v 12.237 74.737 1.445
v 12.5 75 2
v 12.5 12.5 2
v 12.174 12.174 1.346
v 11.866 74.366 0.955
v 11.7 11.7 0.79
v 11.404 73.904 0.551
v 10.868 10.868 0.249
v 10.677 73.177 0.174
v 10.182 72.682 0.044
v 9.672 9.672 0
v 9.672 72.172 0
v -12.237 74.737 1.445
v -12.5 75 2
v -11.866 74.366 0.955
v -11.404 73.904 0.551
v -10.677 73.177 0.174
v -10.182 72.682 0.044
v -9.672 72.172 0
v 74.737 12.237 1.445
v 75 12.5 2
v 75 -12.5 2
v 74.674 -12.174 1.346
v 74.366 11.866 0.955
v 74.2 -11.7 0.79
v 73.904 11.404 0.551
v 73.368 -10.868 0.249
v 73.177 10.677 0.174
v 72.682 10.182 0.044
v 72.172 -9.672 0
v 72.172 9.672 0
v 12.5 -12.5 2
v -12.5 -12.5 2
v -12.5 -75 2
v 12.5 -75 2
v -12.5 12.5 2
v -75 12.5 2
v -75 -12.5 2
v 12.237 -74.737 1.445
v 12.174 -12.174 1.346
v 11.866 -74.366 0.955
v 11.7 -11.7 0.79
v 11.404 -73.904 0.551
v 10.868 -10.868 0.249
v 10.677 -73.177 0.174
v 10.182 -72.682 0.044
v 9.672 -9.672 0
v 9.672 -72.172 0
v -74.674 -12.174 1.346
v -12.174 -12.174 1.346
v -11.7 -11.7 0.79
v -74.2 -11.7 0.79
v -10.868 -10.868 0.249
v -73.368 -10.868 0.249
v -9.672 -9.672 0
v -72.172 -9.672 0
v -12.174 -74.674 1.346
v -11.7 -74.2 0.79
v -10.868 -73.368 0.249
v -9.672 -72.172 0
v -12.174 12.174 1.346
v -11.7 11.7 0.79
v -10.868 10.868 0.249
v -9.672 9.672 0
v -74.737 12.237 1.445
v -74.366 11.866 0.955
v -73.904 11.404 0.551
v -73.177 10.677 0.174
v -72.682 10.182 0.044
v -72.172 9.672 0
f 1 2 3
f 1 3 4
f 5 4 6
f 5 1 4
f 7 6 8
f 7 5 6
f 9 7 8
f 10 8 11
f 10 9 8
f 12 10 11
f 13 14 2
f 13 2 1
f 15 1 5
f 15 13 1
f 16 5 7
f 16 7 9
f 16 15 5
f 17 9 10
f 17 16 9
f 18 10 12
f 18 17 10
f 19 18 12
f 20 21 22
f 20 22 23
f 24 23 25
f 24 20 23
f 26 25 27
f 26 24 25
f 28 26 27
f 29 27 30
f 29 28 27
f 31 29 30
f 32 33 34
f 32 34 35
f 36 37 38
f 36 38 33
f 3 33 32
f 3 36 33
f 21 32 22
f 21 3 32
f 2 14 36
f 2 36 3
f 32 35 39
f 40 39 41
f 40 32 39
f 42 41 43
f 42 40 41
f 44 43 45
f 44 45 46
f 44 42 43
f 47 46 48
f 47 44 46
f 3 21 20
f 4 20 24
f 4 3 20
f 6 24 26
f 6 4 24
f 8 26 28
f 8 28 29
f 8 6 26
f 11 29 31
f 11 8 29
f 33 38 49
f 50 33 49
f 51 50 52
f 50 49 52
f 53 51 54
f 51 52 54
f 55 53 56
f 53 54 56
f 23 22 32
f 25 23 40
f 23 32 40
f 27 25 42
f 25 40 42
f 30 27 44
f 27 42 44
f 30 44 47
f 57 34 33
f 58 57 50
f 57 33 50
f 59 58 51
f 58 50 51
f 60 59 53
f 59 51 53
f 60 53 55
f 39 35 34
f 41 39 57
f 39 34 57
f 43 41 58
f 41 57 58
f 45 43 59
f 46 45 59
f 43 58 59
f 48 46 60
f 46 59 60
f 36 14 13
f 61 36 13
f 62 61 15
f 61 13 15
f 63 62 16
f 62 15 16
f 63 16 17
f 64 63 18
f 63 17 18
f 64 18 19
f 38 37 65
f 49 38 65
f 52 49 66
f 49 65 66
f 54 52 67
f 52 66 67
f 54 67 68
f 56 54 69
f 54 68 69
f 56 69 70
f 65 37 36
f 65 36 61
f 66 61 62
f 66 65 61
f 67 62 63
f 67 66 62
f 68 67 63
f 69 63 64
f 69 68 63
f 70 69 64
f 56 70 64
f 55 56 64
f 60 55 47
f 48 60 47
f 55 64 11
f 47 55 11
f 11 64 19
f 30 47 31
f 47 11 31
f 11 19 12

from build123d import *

# Parameters (mm, degrees)
F0_W         = 62.5
F0_H         = 25
F0_W_2       = 25
F0_H_2       = 62.5
F1_DEPTH     = 2
F2_T1_DEPTH  = 69.5710678119
F2_T3_DEPTH  = 69.5710678119
F2_T5_DEPTH  = 39.1421356237
F2_T7_DEPTH  = 69.5710678119
F2_T9_DEPTH  = 39.1421356237
F2_T11_DEPTH = 69.5710678119
F2_T17_DEPTH = 69.5710678119
F2_T21_DEPTH = 69.5710678119
F2_T28_DEPTH = 69.5710678119
F2_T32_DEPTH = 69.5710678119
F2_T39_DEPTH = 69.5710678119
F2_T43_DEPTH = 69.5710678119
F2_T50_DEPTH = 69.5710678119
F2_T54_DEPTH = 69.5710678119


# Not quite as in the source:
# - a fillet or chamfer that OpenCascade refuses, or shapes differently, is made with other operations: its cross-section is extruded or revolved along the edge and cut away or added
# - a feature names something its author has since deleted; it is built from what else it names


with BuildPart() as f1:
    # F0 (on Top) → F1 (new body)
    with BuildSketch(Plane.XY):
        with Locations((-43.75, 0)):
            Rectangle(F0_W, F0_H)
        Rectangle(F0_W_2, F0_H)
        with Locations((0, -43.75)):
            Rectangle(F0_W_2, F0_H_2)
        with Locations((0, 43.75)):
            Rectangle(F0_W_2, F0_H_2)
        with Locations((43.75, 0)):
            Rectangle(F0_W, F0_H)
    extrude(amount=F1_DEPTH)

    # F2: fillet of radius 3 on 12 edges, made by hand

    # F2_s2 → F2_t1 (cut)
    with BuildSketch(Plane.YZ.offset(-82.0710678119)):
        with BuildLine():
            ThreePointArc((-12.5, 2), (-11.4036236828, 0.5505102572), (-9.6715728753, 0))
            Line((-9.6715728753, 0), (-12.5, 0))
            Line((-12.5, 0), (-12.5, 2))
        make_face()
        with BuildLine():
            ThreePointArc((12.5, 2), (11.4036236828, 0.5505102572), (9.6715728753, 0))
            Line((9.6715728753, 0), (12.5, 0))
            Line((12.5, 0), (12.5, 2))
        make_face()
    extrude(amount=F2_T1_DEPTH, mode=Mode.SUBTRACT)

    # F2_s4 → F2_t3 (cut)
    with BuildSketch(Plane.XZ.offset(12.5)):
        with BuildLine():
            ThreePointArc((-12.5, 2), (-11.4036236828, 0.5505102572), (-9.6715728753, 0))
            Line((-9.6715728753, 0), (-12.5, 0))
            Line((-12.5, 0), (-12.5, 2))
        make_face()
        with BuildLine():
            ThreePointArc((12.5, 2), (11.4036236828, 0.5505102572), (9.6715728753, 0))
            Line((9.6715728753, 0), (12.5, 0))
            Line((12.5, 0), (12.5, 2))
        make_face()
    extrude(amount=F2_T3_DEPTH, mode=Mode.SUBTRACT)

    # F2_s6 → F2_t5 (cut)
    with BuildSketch(Plane.YZ.offset(-19.5710678119)):
        with BuildLine():
            ThreePointArc((-75, 2), (-73.9036236828, 0.5505102572), (-72.1715728753, 0))
            Line((-72.1715728753, 0), (-75, 0))
            Line((-75, 0), (-75, 2))
        make_face()
        with BuildLine():
            ThreePointArc((75, 2), (73.9036236828, 0.5505102572), (72.1715728753, 0))
            Line((72.1715728753, 0), (75, 0))
            Line((75, 0), (75, 2))
        make_face()
    extrude(amount=F2_T5_DEPTH, mode=Mode.SUBTRACT)

    # F2_s8 → F2_t7 (cut)
    with BuildSketch(Plane.YZ.offset(12.5)):
        with BuildLine():
            ThreePointArc((-12.5, 2), (-11.4036236828, 0.5505102572), (-9.6715728753, 0))
            Line((-9.6715728753, 0), (-12.5, 0))
            Line((-12.5, 0), (-12.5, 2))
        make_face()
        with BuildLine():
            ThreePointArc((12.5, 2), (11.4036236828, 0.5505102572), (9.6715728753, 0))
            Line((9.6715728753, 0), (12.5, 0))
            Line((12.5, 0), (12.5, 2))
        make_face()
    extrude(amount=F2_T7_DEPTH, mode=Mode.SUBTRACT)

    # F2_s10 → F2_t9 (cut)
    with BuildSketch(Plane.XZ.offset(-19.5710678119)):
        with BuildLine():
            ThreePointArc((75, 2), (73.9036236828, 0.5505102572), (72.1715728753, 0))
            Line((72.1715728753, 0), (75, 0))
            Line((75, 0), (75, 2))
        make_face()
        with BuildLine():
            ThreePointArc((-75, 2), (-73.9036236828, 0.5505102572), (-72.1715728753, 0))
            Line((-72.1715728753, 0), (-75, 0))
            Line((-75, 0), (-75, 2))
        make_face()
    extrude(amount=F2_T9_DEPTH, mode=Mode.SUBTRACT)

    # F2_s12 → F2_t11 (cut)
    with BuildSketch(Plane.XZ.offset(-82.0710678119)):
        with BuildLine():
            ThreePointArc((12.5, 2), (11.4036236828, 0.5505102572), (9.6715728753, 0))
            Line((9.6715728753, 0), (12.5, 0))
            Line((12.5, 0), (12.5, 2))
        make_face()
        with BuildLine():
            ThreePointArc((-12.5, 2), (-11.4036236828, 0.5505102572), (-9.6715728753, 0))
            Line((-9.6715728753, 0), (-12.5, 0))
            Line((-12.5, 0), (-12.5, 2))
        make_face()
    extrude(amount=F2_T11_DEPTH, mode=Mode.SUBTRACT)


with BuildPart() as f2_tool15:
    # F2_s16 → F2_t17 (new body)
    with BuildSketch(Plane.YZ.offset(-75)):
        with BuildLine():
            ThreePointArc((-12.5, 2), (-11.4036236828, 0.5505102572), (-9.6715728753, 0))
            Line((-9.6715728753, 0), (-12.5, 0))
            Line((-12.5, 0), (-12.5, 2))
        make_face()
    extrude(amount=F2_T17_DEPTH)

    split(bisect_by=Plane.YZ.offset(-12.5), keep=Keep.TOP)


with BuildPart() as f2_tool19:
    # F2_s20 → F2_t21 (new body)
    with BuildSketch(Plane.XZ.offset(5.4289321881)):
        with BuildLine():
            ThreePointArc((-12.5, 2), (-11.4036236828, 0.5505102572), (-9.6715728753, 0))
            Line((-9.6715728753, 0), (-12.5, 0))
            Line((-12.5, 0), (-12.5, 2))
        make_face()
    extrude(amount=F2_T21_DEPTH)

    split(bisect_by=Plane.XZ.offset(12.5), keep=Keep.BOTTOM)


with BuildPart() as f2_tool15_1:
    add(f2_tool15.part)

    # F2_t23: intersect F2_tool19
    add(f2_tool19.part, mode=Mode.INTERSECT)


with BuildPart() as f1_1:
    add(f1.part)

    # F2_t13: cut F2_tool15
    add(f2_tool15_1.part, mode=Mode.SUBTRACT)


with BuildPart() as f2_tool26:
    # F2_s27 → F2_t28 (new body)
    with BuildSketch(Plane.XZ.offset(75)):
        with BuildLine():
            ThreePointArc((12.5, 2), (11.4036236828, 0.5505102572), (9.6715728753, 0))
            Line((9.6715728753, 0), (12.5, 0))
            Line((12.5, 0), (12.5, 2))
        make_face()
    extrude(amount=-F2_T28_DEPTH)

    split(bisect_by=Plane.XZ.offset(12.5), keep=Keep.BOTTOM)


with BuildPart() as f2_tool30:
    # F2_s31 → F2_t32 (new body)
    with BuildSketch(Plane.YZ.offset(5.4289321881)):
        with BuildLine():
            ThreePointArc((-12.5, 2), (-11.4036236828, 0.5505102572), (-9.6715728753, 0))
            Line((-9.6715728753, 0), (-12.5, 0))
            Line((-12.5, 0), (-12.5, 2))
        make_face()
    extrude(amount=F2_T32_DEPTH)

    split(bisect_by=Plane.YZ.offset(12.5), keep=Keep.BOTTOM)


with BuildPart() as f2_tool26_1:
    add(f2_tool26.part)

    # F2_t34: intersect F2_tool30
    add(f2_tool30.part, mode=Mode.INTERSECT)


with BuildPart() as f1_2:
    add(f1_1.part)

    # F2_t24: cut F2_tool26
    add(f2_tool26_1.part, mode=Mode.SUBTRACT)


with BuildPart() as f2_tool37:
    # F2_s38 → F2_t39 (new body)
    with BuildSketch(Plane.YZ.offset(75)):
        with BuildLine():
            ThreePointArc((12.5, 2), (11.4036236828, 0.5505102572), (9.6715728753, 0))
            Line((9.6715728753, 0), (12.5, 0))
            Line((12.5, 0), (12.5, 2))
        make_face()
    extrude(amount=-F2_T39_DEPTH)

    split(bisect_by=Plane.YZ.offset(12.5), keep=Keep.BOTTOM)


with BuildPart() as f2_tool41:
    # F2_s42 → F2_t43 (new body)
    with BuildSketch(Plane.XZ.offset(-5.4289321881)):
        with BuildLine():
            ThreePointArc((12.5, 2), (11.4036236828, 0.5505102572), (9.6715728753, 0))
            Line((9.6715728753, 0), (12.5, 0))
            Line((12.5, 0), (12.5, 2))
        make_face()
    extrude(amount=-F2_T43_DEPTH)

    split(bisect_by=Plane.XZ.offset(-12.5), keep=Keep.TOP)


with BuildPart() as f2_tool37_1:
    add(f2_tool37.part)

    # F2_t45: intersect F2_tool41
    add(f2_tool41.part, mode=Mode.INTERSECT)


with BuildPart() as f1_3:
    add(f1_2.part)

    # F2_t35: cut F2_tool37
    add(f2_tool37_1.part, mode=Mode.SUBTRACT)


with BuildPart() as f2_tool48:
    # F2_s49 → F2_t50 (new body)
    with BuildSketch(Plane.XZ.offset(-75)):
        with BuildLine():
            ThreePointArc((-12.5, 2), (-11.4036236828, 0.5505102572), (-9.6715728753, 0))
            Line((-9.6715728753, 0), (-12.5, 0))
            Line((-12.5, 0), (-12.5, 2))
        make_face()
    extrude(amount=F2_T50_DEPTH)

    split(bisect_by=Plane.XZ.offset(-12.5), keep=Keep.TOP)


with BuildPart() as f2_tool52:
    # F2_s53 → F2_t54 (new body)
    with BuildSketch(Plane.YZ.offset(-5.4289321881)):
        with BuildLine():
            ThreePointArc((12.5, 2), (11.4036236828, 0.5505102572), (9.6715728753, 0))
            Line((9.6715728753, 0), (12.5, 0))
            Line((12.5, 0), (12.5, 2))
        make_face()
    extrude(amount=-F2_T54_DEPTH)

    split(bisect_by=Plane.YZ.offset(-12.5), keep=Keep.TOP)


with BuildPart() as f2_tool48_1:
    add(f2_tool48.part)

    # F2_t56: intersect F2_tool52
    add(f2_tool52.part, mode=Mode.INTERSECT)


with BuildPart() as f1_4:
    add(f1_3.part)

    # F2_t46: cut F2_tool48
    add(f2_tool48_1.part, mode=Mode.SUBTRACT)


solid = f1_4.part
